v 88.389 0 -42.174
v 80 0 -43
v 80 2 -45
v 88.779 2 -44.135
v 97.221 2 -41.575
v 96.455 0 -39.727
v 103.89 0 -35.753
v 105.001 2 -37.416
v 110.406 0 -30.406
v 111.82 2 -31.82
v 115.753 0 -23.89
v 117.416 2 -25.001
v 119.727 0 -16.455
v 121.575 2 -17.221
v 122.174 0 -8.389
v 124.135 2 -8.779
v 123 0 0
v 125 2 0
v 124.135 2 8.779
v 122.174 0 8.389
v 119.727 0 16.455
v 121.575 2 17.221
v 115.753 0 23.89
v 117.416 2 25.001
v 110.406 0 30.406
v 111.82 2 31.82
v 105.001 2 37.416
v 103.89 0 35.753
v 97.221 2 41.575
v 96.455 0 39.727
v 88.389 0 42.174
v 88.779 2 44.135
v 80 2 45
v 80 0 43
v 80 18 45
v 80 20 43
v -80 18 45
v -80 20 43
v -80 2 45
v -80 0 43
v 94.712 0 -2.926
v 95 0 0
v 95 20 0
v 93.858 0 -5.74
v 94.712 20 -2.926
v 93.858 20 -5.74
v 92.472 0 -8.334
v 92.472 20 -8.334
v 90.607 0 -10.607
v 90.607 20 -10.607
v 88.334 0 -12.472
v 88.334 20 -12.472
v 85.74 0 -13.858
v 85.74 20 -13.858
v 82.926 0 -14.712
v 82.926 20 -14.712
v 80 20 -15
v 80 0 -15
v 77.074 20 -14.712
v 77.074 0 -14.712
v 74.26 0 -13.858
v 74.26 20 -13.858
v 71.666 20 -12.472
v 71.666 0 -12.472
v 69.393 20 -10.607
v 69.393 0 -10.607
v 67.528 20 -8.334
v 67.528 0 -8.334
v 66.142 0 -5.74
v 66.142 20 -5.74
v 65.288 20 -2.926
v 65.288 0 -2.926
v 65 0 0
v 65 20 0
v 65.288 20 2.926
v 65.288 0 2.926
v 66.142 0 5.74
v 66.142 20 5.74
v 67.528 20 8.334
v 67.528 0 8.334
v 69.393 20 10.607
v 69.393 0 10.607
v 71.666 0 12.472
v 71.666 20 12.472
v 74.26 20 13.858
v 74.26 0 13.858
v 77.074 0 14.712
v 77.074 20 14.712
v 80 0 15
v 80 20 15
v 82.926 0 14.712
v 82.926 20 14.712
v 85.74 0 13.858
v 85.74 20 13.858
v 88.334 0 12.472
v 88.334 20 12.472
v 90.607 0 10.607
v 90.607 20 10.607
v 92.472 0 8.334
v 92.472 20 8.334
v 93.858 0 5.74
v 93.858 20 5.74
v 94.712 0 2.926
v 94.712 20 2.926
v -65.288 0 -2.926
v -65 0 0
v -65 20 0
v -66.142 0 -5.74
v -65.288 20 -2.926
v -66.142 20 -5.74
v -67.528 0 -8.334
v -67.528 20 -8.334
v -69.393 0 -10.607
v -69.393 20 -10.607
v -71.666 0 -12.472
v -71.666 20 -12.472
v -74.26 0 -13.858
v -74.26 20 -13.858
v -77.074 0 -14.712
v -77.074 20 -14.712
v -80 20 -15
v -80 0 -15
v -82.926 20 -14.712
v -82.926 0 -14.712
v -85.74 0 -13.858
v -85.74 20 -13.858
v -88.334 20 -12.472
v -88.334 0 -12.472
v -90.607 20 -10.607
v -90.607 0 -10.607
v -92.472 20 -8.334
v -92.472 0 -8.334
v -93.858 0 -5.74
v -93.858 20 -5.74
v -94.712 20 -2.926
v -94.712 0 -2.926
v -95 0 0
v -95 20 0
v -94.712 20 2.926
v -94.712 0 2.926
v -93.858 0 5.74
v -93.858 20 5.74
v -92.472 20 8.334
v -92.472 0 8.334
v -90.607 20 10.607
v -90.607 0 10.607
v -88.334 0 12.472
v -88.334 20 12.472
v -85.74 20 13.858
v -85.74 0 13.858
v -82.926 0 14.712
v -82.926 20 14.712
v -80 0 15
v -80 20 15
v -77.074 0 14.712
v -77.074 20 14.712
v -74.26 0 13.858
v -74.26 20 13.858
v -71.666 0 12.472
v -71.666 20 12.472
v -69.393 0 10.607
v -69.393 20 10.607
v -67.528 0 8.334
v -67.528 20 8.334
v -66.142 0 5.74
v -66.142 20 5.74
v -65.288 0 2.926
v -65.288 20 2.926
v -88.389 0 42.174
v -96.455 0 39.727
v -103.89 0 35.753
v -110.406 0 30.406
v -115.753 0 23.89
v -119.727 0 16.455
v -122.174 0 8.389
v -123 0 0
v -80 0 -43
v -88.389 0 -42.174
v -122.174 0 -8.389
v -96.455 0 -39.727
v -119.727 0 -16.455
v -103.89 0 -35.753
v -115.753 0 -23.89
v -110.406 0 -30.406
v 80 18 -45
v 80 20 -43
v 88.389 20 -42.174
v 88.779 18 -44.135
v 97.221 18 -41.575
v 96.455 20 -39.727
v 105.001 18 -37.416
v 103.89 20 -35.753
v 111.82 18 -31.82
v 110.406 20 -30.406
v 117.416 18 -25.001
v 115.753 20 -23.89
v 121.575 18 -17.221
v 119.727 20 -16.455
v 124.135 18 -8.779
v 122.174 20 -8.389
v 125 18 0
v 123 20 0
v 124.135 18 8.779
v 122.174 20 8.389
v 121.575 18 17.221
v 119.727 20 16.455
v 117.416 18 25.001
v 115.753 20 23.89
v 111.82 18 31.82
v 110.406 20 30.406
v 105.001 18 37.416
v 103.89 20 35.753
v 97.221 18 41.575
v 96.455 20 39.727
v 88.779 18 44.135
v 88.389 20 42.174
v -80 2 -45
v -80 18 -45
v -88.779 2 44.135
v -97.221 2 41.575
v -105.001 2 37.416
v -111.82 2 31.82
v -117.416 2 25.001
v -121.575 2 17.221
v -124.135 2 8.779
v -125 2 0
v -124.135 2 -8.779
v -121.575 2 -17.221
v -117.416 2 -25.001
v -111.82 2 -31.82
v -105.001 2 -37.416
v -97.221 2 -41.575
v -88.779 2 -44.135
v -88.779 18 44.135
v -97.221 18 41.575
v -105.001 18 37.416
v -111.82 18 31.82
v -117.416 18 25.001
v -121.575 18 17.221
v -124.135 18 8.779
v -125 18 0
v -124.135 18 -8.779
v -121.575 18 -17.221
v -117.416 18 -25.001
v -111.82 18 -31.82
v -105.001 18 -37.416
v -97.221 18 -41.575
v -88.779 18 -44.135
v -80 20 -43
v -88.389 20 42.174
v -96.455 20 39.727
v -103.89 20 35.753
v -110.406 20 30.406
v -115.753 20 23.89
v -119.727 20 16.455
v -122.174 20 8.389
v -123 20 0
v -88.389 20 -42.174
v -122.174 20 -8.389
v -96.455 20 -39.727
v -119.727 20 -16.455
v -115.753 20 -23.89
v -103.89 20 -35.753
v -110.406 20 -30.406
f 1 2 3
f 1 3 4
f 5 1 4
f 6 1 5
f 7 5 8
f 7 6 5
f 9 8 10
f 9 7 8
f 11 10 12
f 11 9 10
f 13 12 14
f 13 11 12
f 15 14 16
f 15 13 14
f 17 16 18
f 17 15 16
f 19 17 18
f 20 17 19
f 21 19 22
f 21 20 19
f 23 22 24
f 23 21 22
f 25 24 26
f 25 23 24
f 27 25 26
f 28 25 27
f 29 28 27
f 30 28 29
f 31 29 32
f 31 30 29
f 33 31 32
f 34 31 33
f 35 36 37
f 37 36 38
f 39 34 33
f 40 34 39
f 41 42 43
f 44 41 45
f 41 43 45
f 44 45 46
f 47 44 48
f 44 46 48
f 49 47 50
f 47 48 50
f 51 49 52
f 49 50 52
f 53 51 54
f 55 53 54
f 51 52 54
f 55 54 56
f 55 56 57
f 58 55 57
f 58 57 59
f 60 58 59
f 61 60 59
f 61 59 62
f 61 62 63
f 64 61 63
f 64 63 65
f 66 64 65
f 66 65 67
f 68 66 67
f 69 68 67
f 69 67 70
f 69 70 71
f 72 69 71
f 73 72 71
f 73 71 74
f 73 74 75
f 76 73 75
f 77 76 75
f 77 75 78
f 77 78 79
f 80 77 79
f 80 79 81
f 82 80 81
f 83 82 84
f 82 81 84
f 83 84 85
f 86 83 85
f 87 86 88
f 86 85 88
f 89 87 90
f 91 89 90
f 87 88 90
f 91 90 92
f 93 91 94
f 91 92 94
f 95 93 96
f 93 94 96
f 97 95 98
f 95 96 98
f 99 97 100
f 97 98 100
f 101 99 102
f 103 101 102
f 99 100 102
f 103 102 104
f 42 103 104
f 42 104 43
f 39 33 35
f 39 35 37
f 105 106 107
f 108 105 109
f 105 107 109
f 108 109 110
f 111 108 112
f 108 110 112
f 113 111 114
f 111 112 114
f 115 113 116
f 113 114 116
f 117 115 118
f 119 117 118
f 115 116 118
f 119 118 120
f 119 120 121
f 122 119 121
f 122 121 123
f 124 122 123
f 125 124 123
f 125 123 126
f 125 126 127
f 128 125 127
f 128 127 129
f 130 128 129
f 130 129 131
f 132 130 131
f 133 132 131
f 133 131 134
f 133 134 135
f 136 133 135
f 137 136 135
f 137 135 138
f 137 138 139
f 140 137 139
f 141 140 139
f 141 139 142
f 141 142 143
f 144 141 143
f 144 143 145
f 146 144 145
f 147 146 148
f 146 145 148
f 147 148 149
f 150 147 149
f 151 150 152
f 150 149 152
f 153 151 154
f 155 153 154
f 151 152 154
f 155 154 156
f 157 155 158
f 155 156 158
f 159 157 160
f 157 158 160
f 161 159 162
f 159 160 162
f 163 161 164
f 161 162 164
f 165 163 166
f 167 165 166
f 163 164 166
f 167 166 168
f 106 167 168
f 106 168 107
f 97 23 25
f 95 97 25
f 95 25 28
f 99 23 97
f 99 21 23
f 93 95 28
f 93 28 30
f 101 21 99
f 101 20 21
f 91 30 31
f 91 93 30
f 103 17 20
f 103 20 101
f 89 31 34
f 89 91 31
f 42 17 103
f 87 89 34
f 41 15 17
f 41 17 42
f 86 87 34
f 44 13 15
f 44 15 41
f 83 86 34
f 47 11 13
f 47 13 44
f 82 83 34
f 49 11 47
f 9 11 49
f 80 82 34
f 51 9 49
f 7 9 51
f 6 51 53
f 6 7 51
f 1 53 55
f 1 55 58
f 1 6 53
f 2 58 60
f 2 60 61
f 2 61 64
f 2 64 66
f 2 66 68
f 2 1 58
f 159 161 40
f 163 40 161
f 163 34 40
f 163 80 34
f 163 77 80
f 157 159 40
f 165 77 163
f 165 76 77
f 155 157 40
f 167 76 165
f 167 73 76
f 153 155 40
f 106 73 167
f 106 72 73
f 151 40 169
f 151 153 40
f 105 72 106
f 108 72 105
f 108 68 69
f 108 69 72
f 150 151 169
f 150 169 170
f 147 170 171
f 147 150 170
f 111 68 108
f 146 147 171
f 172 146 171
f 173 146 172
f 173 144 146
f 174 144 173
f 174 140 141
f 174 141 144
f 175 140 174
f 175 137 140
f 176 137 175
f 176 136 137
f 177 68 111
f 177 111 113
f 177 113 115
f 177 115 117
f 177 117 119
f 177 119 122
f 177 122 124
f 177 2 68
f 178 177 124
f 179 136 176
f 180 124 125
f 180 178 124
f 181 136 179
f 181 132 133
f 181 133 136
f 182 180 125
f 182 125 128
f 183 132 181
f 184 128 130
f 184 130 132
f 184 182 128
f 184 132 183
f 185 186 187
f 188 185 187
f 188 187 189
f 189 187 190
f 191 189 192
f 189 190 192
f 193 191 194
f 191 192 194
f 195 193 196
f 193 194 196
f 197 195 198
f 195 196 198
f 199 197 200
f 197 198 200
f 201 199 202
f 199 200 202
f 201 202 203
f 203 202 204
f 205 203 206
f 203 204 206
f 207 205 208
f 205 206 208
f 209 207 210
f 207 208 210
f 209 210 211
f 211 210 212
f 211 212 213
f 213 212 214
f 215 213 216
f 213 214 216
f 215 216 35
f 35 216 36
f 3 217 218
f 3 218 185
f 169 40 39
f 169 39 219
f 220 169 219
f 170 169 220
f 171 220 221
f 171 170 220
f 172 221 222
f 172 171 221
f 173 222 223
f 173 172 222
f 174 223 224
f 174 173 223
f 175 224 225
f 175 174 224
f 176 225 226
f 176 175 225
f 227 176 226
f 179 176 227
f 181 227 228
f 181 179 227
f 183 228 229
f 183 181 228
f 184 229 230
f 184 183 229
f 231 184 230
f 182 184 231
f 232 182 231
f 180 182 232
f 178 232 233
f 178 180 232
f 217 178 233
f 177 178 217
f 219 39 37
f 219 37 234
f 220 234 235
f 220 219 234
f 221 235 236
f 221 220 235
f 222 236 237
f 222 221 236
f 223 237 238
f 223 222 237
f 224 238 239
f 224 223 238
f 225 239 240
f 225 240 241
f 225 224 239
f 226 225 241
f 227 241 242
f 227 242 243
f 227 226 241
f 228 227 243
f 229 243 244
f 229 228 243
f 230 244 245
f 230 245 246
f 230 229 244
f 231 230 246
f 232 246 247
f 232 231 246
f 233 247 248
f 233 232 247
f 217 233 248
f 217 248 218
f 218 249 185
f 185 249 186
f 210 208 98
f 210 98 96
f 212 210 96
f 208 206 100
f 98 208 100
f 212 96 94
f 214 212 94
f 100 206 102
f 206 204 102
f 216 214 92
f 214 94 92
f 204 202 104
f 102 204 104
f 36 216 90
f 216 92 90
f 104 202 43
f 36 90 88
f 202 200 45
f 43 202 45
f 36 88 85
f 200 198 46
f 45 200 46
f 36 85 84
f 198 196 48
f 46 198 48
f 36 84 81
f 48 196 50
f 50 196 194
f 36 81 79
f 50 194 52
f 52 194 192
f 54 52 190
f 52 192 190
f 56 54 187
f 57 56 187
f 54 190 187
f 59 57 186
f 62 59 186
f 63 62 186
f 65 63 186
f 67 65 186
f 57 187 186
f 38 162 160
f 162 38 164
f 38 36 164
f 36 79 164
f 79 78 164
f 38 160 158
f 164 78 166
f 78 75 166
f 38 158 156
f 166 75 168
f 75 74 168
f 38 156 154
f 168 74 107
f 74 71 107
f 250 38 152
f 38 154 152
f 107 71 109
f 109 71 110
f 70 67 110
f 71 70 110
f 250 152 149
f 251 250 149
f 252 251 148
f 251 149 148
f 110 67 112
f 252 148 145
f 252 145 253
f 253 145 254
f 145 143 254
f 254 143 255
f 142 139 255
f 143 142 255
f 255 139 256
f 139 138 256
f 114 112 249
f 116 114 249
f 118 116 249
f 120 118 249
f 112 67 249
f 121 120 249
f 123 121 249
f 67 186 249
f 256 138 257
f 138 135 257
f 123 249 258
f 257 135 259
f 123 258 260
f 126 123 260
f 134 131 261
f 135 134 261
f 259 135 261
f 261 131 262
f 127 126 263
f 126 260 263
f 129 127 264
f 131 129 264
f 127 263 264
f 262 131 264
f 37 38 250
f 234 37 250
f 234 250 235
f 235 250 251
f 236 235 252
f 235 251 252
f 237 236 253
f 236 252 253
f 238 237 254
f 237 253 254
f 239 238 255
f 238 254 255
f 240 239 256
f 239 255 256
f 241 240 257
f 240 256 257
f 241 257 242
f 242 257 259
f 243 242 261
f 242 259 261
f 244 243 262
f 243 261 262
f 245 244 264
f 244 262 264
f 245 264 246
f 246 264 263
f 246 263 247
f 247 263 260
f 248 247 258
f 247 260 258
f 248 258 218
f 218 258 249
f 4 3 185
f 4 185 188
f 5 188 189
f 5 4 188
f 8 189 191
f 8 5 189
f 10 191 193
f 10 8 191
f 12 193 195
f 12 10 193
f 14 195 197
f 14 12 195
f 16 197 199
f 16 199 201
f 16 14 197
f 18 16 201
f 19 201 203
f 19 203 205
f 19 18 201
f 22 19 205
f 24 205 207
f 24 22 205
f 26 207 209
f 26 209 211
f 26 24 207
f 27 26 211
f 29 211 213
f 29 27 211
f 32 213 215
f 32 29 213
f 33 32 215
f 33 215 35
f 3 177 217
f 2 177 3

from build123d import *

# Parameters (mm, degrees)
BOSS_EXTRUDE1_DEPTH = 20
SKETCH2_R           = 15
CUT_EXTRUDE1_DEPTH  = 21
CHAMFER1_SIZE       = 2


with BuildPart() as part:
    # Sketch1 → Boss-Extrude1 (new body)
    with BuildSketch(Plane(origin=(0, 0, 0), x_dir=(1, 0, 0), z_dir=(0, 1, 0))):
        with BuildLine():
            Line((-80, 45), (80, 45))
            ThreePointArc((80, 45), (125, 0), (80, -45))
            Line((80, -45), (-80, -45))
            ThreePointArc((-80, -45), (-125, 0), (-80, 45))
        make_face()
    extrude(amount=BOSS_EXTRUDE1_DEPTH)

    # Sketch2 → Cut-Extrude1 (cut, through all)
    with BuildSketch(Plane(origin=(0, 20, 0), x_dir=(1, 0, 0), z_dir=(0, 1, 0))):
        with Locations((-80, 0)):
            Circle(SKETCH2_R)
        with Locations((80, 0)):
            Circle(SKETCH2_R)
    extrude(amount=-CUT_EXTRUDE1_DEPTH, mode=Mode.SUBTRACT)

    # Chamfer1
    chamfer1_edges = [part.edges().sort_by_distance(p)[0] for p in [
        (125, 20, 0),
        (0, 20, -45),
        (-125, 20, 0),
        (0, 0, -45),
        (125, 0, 0),
        (0, 0, 45),
        (-125, 0, 0),
        (0, 20, 45),
    ]]
    chamfer(chamfer1_edges, length=CHAMFER1_SIZE)


solid = part.part
